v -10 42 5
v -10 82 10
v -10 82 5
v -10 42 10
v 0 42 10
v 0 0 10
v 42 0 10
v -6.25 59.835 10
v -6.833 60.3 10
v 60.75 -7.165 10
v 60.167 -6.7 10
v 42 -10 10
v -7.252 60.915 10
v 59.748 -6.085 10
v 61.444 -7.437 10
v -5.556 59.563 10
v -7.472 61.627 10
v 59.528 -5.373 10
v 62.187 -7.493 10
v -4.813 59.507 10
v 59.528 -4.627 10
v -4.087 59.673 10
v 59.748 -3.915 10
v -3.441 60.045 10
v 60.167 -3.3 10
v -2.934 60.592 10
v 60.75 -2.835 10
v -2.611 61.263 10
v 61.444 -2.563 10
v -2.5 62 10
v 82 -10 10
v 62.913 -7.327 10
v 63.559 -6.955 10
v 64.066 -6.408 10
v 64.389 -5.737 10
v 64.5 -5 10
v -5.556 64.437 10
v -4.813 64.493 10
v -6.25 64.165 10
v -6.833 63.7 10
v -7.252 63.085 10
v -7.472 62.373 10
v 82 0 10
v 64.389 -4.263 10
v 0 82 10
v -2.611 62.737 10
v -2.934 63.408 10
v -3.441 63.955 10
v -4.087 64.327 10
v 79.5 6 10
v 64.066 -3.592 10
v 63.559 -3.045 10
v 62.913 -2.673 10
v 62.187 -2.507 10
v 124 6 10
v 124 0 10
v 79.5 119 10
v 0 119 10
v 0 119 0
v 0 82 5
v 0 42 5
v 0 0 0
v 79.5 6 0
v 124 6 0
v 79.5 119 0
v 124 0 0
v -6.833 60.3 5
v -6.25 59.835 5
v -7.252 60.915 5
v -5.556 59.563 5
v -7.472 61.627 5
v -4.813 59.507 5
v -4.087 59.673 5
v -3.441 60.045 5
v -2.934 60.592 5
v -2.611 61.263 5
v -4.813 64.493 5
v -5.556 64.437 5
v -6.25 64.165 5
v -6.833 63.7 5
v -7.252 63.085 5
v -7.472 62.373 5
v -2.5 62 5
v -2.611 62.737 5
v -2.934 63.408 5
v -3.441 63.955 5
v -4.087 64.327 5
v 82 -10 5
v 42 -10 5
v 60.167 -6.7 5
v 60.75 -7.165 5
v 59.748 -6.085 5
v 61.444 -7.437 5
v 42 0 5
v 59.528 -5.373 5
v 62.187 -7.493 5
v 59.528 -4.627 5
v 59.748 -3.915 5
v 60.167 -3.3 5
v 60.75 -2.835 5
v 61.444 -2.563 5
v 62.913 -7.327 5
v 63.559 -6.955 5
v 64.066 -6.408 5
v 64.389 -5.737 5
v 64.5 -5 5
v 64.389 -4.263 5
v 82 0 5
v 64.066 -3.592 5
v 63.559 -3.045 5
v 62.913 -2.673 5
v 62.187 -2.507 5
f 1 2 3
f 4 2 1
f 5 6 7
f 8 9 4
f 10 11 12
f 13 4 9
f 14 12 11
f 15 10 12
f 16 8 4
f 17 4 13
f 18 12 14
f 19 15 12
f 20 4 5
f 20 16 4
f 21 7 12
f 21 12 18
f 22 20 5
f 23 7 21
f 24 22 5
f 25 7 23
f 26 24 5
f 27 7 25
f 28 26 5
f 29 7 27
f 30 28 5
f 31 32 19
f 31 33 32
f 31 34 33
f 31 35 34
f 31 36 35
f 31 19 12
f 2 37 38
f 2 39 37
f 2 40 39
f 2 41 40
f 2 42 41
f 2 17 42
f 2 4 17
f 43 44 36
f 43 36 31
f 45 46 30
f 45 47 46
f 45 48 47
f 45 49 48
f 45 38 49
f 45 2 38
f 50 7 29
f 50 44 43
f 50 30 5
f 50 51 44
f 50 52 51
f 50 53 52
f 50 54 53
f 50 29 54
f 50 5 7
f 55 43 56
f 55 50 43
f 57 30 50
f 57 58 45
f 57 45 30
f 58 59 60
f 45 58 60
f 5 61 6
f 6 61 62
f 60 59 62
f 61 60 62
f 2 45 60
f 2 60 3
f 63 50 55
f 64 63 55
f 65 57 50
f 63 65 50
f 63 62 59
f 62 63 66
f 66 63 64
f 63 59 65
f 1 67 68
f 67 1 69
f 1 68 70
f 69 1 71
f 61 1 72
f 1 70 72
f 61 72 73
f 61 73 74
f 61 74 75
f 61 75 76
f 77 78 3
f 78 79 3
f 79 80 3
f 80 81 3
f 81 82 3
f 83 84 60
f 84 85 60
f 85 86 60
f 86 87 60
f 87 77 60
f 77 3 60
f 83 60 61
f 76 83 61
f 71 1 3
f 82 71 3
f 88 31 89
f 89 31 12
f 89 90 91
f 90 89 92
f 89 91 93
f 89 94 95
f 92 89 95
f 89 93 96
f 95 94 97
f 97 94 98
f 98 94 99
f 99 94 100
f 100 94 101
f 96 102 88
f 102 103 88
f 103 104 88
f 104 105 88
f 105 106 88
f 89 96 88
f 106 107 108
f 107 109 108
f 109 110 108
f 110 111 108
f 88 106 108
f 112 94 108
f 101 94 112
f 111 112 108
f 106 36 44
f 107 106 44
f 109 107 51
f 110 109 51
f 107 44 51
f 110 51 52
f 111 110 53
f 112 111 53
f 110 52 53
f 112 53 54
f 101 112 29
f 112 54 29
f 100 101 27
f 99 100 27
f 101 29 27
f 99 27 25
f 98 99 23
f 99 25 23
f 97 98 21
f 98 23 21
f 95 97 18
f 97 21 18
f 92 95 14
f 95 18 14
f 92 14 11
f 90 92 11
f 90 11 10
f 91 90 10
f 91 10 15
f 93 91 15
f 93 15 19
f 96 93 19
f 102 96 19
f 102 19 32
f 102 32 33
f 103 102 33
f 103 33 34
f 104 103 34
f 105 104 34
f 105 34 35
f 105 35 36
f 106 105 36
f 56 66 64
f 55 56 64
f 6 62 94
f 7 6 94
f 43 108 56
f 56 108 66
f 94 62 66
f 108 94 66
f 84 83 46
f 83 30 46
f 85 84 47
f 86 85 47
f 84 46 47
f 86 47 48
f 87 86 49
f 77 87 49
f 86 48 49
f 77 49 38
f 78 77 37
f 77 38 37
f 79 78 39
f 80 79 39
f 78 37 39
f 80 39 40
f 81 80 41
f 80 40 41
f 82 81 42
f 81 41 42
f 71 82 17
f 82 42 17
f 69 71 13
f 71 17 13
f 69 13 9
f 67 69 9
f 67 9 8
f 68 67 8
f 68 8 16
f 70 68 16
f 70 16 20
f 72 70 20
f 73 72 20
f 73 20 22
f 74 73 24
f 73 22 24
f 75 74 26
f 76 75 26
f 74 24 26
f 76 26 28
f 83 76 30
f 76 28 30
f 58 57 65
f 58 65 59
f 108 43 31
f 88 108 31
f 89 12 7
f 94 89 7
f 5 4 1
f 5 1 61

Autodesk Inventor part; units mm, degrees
ref_plane "YZ Plane" through (0, 0, 0) normal (1, 0, 0) x (0, 1, 0)
ref_plane "XZ Plane" through (0, 0, 0) normal (0, 1, 0) x (-1, 0, 0)
ref_plane "XY Plane" through (0, 0, 0) normal (0, 0, 1) x (1, 0, 0)
sketch "Sketch1" plane through (0, 0, 0) normal (0, 0, 1) x (1, 0, 0)
  line L0 (0, 0) -> (124, 0)
  line L1 (124, 0) -> (124, 124)
  line L2 (124, 124) -> (0, 124)
  line L3 (0, 124) -> (0, 0)
  dimension "d0" = 124
  dimension "d1" = 124
extrude "Extrusion1" add sketch "Sketch1" along normal blind 10
sketch "Sketch2" plane through (0, 0, 10) normal (0, 0, 1) x (1, 0, 0)
  line L0 (124, 0) -> (124, 124) projected
  line L1 (124, 124) -> (79.5, 124)
  line L2 (79.5, 124) -> (79.5, 6)
  line L3 (79.5, 6) -> (124, 6)
  line L4 (124, 6) -> (124, 124)
  point P0 (0, 0)
  dimension "d4" = 44.5
  dimension "d5" = 118
extrude "Extrusion2" cut sketch "Sketch2" against normal through all
sketch "Sketch3" plane through (0, 0, 10) normal (0, 0, 1) x (1, 0, 0)
  line L0 (0, 124) -> (0, 0) projected
  line L1 (0, 82) -> (-10, 82)
  line L2 (-10, 82) -> (-10, 42)
  line L3 (-10, 42) -> (0, 42)
  line L4 (0, 42) -> (0, 82)
  circle A0 centre (-5, 62) radius 2.5
  line L5 (0, 0) -> (124, 0) projected
  line L6 (42, 0) -> (82, 0)
  line L7 (82, 0) -> (82, -10)
  line L8 (82, -10) -> (42, -10)
  line L9 (42, -10) -> (42, 0)
  circle A1 centre (62, -5) radius 2.5
  point P0 (-10, 62)
  point P1 (0, 62)
  point P2 (-5, 82)
  point P3 (62, -10)
  point P4 (62, 0)
  point P5 (62, 0)
  point P6 (42, -5)
  dimension "d8" = 10
  dimension "d9" = 40
  dimension "d10" = 5
  dimension "d11" = 40
  dimension "d12" = 10
  dimension "d13" = 5
extrude "Extrusion3" add sketch "Sketch3" against normal blind 5
sketch "Sketch5" plane through (0, 0, 10) normal (0, 0, 1) x (1, 0, 0)
  line L0 (0, 124) -> (0, 82) projected
  line L1 (0, 124) -> (79.5, 124)
  line L2 (79.5, 124) -> (79.5, 119)
  line L3 (79.5, 119) -> (0, 119)
  line L4 (0, 119) -> (0, 124)
  line L5 (79.5, 6) -> (79.5, 124) projected
  point P0 (0, 0)
  dimension "d19" = 5
extrude "Extrusion5" cut sketch "Sketch5" against normal through all
properties part number "TC004" material "ABS Plastic"
